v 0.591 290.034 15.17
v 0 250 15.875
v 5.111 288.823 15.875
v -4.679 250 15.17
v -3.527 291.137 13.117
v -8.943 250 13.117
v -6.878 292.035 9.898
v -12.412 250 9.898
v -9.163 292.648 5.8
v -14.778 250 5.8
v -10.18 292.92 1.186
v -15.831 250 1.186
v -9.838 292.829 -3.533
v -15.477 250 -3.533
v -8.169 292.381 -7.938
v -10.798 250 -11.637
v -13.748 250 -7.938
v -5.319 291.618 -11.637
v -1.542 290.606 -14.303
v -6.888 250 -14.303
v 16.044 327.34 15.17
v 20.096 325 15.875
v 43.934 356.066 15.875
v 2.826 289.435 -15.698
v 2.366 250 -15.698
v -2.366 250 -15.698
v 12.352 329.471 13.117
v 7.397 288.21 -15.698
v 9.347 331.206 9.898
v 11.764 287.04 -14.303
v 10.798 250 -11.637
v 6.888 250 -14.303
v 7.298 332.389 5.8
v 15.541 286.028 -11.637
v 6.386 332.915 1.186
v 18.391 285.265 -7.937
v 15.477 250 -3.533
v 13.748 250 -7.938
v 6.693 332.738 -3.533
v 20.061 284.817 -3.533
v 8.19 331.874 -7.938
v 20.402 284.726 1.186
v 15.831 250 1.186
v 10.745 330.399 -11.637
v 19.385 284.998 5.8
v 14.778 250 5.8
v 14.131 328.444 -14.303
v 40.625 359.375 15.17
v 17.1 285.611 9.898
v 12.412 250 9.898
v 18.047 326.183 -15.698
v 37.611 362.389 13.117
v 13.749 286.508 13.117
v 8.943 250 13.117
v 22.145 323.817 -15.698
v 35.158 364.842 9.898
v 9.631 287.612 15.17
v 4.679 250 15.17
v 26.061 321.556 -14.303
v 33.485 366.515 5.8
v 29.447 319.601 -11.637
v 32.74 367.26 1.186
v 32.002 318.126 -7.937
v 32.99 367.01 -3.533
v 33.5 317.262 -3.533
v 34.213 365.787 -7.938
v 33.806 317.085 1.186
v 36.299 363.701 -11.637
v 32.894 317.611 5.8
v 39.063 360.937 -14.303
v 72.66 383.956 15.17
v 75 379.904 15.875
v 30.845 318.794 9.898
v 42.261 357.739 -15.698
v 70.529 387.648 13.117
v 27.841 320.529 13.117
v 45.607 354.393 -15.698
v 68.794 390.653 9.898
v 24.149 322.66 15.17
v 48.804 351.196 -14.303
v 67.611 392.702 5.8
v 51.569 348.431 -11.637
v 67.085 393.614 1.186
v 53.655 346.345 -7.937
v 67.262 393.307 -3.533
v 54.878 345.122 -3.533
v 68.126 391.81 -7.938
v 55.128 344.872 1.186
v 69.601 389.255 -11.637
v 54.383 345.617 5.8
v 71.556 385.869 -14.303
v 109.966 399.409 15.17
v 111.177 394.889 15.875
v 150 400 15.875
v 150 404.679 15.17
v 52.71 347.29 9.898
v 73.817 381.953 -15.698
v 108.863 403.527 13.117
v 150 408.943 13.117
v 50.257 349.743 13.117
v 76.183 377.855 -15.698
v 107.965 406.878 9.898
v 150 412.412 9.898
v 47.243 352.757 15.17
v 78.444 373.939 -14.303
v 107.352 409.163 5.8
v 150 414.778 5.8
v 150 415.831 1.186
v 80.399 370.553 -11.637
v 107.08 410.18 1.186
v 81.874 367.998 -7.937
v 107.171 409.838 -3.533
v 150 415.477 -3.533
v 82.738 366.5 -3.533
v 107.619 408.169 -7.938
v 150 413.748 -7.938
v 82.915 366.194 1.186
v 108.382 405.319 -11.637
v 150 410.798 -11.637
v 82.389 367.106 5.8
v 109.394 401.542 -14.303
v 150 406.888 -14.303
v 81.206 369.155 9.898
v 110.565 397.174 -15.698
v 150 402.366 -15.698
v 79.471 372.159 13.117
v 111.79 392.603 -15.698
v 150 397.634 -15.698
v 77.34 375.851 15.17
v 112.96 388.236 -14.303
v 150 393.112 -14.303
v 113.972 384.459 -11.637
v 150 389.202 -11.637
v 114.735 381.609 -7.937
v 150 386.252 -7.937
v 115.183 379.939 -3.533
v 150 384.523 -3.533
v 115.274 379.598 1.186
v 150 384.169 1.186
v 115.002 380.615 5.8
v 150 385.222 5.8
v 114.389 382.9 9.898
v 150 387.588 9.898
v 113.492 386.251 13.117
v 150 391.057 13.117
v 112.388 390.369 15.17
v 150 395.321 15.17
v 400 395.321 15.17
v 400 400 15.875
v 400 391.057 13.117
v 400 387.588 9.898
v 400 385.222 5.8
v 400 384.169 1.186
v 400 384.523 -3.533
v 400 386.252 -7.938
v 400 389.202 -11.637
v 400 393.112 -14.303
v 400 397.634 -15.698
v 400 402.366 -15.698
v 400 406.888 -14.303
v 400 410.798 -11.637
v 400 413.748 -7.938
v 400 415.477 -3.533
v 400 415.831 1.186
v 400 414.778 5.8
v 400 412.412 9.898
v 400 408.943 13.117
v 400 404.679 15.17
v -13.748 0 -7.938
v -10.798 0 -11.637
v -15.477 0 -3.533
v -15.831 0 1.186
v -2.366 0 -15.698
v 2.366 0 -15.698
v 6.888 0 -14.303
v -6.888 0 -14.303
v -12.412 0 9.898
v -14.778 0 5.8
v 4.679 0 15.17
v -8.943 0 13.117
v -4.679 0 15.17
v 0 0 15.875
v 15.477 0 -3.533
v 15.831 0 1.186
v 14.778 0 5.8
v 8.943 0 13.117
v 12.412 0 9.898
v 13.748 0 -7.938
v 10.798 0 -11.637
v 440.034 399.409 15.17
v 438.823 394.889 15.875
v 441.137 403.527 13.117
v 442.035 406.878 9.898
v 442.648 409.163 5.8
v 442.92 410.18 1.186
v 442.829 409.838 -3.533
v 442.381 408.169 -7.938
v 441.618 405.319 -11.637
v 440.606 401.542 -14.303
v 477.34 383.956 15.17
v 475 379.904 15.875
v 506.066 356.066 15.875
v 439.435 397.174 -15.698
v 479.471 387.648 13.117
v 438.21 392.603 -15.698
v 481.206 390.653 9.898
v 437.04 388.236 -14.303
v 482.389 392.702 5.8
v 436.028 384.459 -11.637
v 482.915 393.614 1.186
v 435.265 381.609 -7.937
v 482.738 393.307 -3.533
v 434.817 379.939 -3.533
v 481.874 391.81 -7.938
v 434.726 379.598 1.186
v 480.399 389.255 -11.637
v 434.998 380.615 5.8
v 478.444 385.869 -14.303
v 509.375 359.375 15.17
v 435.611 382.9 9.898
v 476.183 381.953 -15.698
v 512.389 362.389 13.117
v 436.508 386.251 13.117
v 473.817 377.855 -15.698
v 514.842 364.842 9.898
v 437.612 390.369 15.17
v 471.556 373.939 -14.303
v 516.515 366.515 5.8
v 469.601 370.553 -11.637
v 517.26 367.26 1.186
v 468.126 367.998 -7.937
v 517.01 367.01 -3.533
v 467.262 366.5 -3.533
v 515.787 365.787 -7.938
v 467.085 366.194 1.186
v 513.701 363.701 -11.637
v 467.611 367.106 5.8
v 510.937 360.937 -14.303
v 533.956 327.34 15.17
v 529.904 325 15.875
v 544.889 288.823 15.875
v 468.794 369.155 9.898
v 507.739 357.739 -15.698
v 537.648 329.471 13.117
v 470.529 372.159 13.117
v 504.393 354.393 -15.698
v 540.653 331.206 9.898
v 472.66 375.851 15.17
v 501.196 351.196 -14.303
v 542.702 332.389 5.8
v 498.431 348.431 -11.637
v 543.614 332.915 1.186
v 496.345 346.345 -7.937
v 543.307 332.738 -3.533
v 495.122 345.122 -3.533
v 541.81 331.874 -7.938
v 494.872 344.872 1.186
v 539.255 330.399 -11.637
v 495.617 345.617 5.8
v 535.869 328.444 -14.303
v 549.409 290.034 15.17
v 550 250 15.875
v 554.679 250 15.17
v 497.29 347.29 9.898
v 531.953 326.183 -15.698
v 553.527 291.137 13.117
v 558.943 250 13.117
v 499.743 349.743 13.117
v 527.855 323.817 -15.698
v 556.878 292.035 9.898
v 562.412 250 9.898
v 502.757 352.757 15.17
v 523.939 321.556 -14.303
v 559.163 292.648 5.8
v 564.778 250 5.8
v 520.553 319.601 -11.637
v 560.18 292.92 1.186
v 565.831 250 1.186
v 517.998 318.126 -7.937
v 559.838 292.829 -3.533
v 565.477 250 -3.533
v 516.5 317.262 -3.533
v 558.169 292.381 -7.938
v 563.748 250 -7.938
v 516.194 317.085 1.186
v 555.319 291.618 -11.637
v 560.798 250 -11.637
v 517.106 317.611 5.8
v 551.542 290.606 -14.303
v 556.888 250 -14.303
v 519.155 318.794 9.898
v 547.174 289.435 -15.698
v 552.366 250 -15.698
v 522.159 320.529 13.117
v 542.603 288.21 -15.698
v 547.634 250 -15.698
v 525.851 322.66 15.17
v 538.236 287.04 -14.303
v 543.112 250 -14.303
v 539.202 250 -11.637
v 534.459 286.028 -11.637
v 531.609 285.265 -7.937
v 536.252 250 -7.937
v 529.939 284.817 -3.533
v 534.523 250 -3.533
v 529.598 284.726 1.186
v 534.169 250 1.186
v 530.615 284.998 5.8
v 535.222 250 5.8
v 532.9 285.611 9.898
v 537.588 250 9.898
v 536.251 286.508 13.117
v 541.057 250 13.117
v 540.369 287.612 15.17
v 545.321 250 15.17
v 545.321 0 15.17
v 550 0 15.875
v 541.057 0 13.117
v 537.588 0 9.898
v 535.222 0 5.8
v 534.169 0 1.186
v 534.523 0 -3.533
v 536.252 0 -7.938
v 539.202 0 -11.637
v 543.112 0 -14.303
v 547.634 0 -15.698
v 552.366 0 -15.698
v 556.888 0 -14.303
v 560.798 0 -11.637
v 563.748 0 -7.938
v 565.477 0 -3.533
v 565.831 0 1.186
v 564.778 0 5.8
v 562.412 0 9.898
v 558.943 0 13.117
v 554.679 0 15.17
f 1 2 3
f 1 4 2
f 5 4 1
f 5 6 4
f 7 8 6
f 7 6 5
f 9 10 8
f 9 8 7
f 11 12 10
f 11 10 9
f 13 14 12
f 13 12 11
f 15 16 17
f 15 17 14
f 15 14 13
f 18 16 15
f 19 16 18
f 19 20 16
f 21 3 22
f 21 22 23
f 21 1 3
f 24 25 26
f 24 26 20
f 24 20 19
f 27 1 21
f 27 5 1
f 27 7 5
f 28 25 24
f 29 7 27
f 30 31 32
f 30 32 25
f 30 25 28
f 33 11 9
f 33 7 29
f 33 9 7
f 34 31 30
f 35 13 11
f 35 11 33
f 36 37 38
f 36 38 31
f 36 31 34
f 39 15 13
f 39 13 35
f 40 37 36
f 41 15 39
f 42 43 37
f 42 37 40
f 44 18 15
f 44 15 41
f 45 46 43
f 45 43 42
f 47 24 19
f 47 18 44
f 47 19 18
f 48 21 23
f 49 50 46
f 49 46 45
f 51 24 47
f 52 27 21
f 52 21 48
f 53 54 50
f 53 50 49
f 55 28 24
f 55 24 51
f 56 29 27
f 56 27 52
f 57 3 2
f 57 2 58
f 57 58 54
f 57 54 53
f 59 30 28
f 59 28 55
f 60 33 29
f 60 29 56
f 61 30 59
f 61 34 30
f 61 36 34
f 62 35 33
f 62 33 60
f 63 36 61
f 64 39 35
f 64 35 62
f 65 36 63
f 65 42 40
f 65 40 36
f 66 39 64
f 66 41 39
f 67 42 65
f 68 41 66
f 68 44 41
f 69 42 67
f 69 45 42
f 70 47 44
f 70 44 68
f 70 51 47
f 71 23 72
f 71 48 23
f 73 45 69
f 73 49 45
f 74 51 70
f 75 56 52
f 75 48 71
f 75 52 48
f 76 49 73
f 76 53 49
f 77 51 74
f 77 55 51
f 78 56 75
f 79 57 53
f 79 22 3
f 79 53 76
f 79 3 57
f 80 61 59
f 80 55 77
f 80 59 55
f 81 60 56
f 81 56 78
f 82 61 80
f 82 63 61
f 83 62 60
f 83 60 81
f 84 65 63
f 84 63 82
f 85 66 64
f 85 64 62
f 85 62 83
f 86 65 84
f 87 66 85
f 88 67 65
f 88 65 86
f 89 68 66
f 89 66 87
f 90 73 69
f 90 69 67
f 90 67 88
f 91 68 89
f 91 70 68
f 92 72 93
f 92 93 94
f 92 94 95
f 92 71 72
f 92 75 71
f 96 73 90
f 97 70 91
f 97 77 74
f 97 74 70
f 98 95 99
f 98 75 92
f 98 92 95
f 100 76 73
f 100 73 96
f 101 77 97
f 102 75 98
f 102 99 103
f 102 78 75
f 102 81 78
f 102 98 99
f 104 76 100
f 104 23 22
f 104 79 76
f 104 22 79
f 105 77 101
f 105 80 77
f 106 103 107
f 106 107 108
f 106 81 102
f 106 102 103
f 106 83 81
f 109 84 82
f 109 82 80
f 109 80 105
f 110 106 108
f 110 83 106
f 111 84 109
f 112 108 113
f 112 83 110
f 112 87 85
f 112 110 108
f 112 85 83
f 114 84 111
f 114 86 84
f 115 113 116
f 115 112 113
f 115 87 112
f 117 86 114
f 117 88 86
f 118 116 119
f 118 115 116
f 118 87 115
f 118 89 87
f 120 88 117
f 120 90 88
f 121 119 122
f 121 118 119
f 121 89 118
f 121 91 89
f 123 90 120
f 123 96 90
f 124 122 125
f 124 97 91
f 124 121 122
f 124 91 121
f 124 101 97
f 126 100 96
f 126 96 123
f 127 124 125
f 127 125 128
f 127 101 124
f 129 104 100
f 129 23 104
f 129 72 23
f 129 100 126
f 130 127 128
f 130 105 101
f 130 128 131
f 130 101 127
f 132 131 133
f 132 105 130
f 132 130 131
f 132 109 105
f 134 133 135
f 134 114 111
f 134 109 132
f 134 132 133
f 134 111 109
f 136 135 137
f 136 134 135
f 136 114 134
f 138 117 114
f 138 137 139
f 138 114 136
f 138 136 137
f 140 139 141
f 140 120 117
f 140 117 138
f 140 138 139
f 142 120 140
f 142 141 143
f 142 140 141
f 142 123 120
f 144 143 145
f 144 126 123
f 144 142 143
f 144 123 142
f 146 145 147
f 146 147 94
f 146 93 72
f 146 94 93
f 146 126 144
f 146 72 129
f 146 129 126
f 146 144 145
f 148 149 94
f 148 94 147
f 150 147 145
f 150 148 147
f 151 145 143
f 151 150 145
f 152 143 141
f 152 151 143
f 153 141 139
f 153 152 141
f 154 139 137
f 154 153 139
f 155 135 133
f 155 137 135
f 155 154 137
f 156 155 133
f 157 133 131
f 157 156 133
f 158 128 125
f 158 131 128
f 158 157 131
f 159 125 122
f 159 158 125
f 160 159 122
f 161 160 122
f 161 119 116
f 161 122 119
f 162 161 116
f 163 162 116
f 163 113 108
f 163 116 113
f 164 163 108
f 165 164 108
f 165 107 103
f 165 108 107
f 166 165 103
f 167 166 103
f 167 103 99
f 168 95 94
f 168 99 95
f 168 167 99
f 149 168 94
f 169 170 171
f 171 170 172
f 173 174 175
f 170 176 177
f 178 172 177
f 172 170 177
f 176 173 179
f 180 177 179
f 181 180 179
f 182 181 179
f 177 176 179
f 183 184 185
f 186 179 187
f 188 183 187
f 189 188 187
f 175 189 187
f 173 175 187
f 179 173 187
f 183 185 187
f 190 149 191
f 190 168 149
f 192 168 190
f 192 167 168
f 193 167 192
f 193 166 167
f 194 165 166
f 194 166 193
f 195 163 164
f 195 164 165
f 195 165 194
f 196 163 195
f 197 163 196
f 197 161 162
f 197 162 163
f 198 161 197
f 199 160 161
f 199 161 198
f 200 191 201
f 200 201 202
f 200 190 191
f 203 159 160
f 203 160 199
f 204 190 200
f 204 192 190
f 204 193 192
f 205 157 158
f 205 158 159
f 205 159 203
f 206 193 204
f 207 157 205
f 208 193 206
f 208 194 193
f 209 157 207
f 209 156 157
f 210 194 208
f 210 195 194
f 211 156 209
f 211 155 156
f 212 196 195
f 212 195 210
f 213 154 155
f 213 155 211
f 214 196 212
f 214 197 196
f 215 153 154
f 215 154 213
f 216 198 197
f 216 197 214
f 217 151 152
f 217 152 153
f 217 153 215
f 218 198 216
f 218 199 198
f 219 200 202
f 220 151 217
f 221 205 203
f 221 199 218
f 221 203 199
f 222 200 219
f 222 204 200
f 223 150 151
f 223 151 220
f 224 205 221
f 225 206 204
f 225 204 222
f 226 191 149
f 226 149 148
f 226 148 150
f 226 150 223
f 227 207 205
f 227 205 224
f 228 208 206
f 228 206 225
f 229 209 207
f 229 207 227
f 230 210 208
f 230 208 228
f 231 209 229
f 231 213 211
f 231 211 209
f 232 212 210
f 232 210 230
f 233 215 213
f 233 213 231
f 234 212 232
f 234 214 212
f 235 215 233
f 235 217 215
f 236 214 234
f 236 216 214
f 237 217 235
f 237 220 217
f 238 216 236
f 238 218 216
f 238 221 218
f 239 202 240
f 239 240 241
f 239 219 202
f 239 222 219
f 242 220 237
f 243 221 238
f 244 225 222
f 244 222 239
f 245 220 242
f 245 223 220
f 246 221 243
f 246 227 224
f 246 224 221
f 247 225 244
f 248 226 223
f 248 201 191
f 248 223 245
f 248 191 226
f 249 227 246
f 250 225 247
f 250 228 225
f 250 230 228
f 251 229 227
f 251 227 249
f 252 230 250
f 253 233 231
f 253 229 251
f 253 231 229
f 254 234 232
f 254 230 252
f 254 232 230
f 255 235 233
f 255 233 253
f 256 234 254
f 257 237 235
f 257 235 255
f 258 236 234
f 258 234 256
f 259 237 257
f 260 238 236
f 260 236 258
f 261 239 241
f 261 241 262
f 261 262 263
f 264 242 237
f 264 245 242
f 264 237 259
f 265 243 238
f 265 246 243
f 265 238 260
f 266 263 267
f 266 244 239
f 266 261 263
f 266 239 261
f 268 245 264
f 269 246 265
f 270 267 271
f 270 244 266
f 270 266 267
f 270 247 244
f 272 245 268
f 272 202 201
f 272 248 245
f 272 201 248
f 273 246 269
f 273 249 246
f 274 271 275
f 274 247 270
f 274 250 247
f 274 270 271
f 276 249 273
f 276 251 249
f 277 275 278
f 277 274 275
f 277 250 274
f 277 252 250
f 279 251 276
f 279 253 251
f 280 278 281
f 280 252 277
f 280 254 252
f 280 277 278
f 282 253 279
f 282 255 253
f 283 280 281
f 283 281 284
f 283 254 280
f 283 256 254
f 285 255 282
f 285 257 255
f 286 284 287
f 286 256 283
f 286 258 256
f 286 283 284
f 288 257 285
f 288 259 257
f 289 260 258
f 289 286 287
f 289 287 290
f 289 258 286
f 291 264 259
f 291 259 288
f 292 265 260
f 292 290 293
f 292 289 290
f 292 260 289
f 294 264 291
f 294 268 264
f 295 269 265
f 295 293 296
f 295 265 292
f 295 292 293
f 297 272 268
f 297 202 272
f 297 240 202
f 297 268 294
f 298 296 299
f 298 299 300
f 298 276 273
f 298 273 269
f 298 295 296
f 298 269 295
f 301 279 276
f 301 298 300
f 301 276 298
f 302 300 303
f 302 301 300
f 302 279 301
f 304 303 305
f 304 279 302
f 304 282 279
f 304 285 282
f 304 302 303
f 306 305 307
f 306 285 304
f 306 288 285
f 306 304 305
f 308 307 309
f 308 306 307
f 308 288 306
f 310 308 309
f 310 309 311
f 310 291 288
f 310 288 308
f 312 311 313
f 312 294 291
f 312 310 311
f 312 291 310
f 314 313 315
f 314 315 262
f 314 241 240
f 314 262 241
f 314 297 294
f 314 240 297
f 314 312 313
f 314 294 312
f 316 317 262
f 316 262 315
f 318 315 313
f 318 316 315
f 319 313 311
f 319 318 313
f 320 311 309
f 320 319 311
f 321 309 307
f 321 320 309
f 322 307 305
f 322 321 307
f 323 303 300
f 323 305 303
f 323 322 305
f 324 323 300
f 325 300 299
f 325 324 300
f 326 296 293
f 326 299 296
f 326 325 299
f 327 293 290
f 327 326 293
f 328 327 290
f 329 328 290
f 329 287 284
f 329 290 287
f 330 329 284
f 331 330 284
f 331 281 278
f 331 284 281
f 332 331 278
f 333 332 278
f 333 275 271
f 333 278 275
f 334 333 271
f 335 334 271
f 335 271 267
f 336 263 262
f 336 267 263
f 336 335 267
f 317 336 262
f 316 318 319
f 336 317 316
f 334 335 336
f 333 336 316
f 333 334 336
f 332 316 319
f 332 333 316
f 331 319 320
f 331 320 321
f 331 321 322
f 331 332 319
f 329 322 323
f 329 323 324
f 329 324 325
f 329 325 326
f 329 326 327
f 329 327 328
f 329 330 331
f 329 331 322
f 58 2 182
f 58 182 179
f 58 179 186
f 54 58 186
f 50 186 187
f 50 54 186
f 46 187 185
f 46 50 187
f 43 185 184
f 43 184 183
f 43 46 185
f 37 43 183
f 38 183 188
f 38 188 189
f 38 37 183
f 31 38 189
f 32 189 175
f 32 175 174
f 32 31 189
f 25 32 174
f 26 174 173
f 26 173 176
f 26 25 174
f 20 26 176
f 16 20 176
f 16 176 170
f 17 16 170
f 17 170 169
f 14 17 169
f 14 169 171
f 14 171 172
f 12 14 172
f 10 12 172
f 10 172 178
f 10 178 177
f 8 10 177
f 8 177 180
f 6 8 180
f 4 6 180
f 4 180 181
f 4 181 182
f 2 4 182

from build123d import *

# Parameters (mm, degrees)
BALAYAGE1_PROFILE_R = 15.875


with BuildPart() as part:
    # Balayage1: sweep along a path in Esquisse2
    with BuildLine(Plane.XY) as balayage1_path:
        Line((0, 0), (0, 250))
        ThreePointArc((0, 250), (43.933982822, 356.066017178), (150, 400))
        Line((150, 400), (400, 400))
        ThreePointArc((400, 400), (506.066017178, 356.066017178), (550, 250))
        Line((550, 250), (550, 0))
    # Balayage1 profile (on start of the path) → Balayage1 (sweep)
    with BuildSketch(Plane.ZX):
        Circle(BALAYAGE1_PROFILE_R)
    sweep(path=balayage1_path.line)


solid = part.part
